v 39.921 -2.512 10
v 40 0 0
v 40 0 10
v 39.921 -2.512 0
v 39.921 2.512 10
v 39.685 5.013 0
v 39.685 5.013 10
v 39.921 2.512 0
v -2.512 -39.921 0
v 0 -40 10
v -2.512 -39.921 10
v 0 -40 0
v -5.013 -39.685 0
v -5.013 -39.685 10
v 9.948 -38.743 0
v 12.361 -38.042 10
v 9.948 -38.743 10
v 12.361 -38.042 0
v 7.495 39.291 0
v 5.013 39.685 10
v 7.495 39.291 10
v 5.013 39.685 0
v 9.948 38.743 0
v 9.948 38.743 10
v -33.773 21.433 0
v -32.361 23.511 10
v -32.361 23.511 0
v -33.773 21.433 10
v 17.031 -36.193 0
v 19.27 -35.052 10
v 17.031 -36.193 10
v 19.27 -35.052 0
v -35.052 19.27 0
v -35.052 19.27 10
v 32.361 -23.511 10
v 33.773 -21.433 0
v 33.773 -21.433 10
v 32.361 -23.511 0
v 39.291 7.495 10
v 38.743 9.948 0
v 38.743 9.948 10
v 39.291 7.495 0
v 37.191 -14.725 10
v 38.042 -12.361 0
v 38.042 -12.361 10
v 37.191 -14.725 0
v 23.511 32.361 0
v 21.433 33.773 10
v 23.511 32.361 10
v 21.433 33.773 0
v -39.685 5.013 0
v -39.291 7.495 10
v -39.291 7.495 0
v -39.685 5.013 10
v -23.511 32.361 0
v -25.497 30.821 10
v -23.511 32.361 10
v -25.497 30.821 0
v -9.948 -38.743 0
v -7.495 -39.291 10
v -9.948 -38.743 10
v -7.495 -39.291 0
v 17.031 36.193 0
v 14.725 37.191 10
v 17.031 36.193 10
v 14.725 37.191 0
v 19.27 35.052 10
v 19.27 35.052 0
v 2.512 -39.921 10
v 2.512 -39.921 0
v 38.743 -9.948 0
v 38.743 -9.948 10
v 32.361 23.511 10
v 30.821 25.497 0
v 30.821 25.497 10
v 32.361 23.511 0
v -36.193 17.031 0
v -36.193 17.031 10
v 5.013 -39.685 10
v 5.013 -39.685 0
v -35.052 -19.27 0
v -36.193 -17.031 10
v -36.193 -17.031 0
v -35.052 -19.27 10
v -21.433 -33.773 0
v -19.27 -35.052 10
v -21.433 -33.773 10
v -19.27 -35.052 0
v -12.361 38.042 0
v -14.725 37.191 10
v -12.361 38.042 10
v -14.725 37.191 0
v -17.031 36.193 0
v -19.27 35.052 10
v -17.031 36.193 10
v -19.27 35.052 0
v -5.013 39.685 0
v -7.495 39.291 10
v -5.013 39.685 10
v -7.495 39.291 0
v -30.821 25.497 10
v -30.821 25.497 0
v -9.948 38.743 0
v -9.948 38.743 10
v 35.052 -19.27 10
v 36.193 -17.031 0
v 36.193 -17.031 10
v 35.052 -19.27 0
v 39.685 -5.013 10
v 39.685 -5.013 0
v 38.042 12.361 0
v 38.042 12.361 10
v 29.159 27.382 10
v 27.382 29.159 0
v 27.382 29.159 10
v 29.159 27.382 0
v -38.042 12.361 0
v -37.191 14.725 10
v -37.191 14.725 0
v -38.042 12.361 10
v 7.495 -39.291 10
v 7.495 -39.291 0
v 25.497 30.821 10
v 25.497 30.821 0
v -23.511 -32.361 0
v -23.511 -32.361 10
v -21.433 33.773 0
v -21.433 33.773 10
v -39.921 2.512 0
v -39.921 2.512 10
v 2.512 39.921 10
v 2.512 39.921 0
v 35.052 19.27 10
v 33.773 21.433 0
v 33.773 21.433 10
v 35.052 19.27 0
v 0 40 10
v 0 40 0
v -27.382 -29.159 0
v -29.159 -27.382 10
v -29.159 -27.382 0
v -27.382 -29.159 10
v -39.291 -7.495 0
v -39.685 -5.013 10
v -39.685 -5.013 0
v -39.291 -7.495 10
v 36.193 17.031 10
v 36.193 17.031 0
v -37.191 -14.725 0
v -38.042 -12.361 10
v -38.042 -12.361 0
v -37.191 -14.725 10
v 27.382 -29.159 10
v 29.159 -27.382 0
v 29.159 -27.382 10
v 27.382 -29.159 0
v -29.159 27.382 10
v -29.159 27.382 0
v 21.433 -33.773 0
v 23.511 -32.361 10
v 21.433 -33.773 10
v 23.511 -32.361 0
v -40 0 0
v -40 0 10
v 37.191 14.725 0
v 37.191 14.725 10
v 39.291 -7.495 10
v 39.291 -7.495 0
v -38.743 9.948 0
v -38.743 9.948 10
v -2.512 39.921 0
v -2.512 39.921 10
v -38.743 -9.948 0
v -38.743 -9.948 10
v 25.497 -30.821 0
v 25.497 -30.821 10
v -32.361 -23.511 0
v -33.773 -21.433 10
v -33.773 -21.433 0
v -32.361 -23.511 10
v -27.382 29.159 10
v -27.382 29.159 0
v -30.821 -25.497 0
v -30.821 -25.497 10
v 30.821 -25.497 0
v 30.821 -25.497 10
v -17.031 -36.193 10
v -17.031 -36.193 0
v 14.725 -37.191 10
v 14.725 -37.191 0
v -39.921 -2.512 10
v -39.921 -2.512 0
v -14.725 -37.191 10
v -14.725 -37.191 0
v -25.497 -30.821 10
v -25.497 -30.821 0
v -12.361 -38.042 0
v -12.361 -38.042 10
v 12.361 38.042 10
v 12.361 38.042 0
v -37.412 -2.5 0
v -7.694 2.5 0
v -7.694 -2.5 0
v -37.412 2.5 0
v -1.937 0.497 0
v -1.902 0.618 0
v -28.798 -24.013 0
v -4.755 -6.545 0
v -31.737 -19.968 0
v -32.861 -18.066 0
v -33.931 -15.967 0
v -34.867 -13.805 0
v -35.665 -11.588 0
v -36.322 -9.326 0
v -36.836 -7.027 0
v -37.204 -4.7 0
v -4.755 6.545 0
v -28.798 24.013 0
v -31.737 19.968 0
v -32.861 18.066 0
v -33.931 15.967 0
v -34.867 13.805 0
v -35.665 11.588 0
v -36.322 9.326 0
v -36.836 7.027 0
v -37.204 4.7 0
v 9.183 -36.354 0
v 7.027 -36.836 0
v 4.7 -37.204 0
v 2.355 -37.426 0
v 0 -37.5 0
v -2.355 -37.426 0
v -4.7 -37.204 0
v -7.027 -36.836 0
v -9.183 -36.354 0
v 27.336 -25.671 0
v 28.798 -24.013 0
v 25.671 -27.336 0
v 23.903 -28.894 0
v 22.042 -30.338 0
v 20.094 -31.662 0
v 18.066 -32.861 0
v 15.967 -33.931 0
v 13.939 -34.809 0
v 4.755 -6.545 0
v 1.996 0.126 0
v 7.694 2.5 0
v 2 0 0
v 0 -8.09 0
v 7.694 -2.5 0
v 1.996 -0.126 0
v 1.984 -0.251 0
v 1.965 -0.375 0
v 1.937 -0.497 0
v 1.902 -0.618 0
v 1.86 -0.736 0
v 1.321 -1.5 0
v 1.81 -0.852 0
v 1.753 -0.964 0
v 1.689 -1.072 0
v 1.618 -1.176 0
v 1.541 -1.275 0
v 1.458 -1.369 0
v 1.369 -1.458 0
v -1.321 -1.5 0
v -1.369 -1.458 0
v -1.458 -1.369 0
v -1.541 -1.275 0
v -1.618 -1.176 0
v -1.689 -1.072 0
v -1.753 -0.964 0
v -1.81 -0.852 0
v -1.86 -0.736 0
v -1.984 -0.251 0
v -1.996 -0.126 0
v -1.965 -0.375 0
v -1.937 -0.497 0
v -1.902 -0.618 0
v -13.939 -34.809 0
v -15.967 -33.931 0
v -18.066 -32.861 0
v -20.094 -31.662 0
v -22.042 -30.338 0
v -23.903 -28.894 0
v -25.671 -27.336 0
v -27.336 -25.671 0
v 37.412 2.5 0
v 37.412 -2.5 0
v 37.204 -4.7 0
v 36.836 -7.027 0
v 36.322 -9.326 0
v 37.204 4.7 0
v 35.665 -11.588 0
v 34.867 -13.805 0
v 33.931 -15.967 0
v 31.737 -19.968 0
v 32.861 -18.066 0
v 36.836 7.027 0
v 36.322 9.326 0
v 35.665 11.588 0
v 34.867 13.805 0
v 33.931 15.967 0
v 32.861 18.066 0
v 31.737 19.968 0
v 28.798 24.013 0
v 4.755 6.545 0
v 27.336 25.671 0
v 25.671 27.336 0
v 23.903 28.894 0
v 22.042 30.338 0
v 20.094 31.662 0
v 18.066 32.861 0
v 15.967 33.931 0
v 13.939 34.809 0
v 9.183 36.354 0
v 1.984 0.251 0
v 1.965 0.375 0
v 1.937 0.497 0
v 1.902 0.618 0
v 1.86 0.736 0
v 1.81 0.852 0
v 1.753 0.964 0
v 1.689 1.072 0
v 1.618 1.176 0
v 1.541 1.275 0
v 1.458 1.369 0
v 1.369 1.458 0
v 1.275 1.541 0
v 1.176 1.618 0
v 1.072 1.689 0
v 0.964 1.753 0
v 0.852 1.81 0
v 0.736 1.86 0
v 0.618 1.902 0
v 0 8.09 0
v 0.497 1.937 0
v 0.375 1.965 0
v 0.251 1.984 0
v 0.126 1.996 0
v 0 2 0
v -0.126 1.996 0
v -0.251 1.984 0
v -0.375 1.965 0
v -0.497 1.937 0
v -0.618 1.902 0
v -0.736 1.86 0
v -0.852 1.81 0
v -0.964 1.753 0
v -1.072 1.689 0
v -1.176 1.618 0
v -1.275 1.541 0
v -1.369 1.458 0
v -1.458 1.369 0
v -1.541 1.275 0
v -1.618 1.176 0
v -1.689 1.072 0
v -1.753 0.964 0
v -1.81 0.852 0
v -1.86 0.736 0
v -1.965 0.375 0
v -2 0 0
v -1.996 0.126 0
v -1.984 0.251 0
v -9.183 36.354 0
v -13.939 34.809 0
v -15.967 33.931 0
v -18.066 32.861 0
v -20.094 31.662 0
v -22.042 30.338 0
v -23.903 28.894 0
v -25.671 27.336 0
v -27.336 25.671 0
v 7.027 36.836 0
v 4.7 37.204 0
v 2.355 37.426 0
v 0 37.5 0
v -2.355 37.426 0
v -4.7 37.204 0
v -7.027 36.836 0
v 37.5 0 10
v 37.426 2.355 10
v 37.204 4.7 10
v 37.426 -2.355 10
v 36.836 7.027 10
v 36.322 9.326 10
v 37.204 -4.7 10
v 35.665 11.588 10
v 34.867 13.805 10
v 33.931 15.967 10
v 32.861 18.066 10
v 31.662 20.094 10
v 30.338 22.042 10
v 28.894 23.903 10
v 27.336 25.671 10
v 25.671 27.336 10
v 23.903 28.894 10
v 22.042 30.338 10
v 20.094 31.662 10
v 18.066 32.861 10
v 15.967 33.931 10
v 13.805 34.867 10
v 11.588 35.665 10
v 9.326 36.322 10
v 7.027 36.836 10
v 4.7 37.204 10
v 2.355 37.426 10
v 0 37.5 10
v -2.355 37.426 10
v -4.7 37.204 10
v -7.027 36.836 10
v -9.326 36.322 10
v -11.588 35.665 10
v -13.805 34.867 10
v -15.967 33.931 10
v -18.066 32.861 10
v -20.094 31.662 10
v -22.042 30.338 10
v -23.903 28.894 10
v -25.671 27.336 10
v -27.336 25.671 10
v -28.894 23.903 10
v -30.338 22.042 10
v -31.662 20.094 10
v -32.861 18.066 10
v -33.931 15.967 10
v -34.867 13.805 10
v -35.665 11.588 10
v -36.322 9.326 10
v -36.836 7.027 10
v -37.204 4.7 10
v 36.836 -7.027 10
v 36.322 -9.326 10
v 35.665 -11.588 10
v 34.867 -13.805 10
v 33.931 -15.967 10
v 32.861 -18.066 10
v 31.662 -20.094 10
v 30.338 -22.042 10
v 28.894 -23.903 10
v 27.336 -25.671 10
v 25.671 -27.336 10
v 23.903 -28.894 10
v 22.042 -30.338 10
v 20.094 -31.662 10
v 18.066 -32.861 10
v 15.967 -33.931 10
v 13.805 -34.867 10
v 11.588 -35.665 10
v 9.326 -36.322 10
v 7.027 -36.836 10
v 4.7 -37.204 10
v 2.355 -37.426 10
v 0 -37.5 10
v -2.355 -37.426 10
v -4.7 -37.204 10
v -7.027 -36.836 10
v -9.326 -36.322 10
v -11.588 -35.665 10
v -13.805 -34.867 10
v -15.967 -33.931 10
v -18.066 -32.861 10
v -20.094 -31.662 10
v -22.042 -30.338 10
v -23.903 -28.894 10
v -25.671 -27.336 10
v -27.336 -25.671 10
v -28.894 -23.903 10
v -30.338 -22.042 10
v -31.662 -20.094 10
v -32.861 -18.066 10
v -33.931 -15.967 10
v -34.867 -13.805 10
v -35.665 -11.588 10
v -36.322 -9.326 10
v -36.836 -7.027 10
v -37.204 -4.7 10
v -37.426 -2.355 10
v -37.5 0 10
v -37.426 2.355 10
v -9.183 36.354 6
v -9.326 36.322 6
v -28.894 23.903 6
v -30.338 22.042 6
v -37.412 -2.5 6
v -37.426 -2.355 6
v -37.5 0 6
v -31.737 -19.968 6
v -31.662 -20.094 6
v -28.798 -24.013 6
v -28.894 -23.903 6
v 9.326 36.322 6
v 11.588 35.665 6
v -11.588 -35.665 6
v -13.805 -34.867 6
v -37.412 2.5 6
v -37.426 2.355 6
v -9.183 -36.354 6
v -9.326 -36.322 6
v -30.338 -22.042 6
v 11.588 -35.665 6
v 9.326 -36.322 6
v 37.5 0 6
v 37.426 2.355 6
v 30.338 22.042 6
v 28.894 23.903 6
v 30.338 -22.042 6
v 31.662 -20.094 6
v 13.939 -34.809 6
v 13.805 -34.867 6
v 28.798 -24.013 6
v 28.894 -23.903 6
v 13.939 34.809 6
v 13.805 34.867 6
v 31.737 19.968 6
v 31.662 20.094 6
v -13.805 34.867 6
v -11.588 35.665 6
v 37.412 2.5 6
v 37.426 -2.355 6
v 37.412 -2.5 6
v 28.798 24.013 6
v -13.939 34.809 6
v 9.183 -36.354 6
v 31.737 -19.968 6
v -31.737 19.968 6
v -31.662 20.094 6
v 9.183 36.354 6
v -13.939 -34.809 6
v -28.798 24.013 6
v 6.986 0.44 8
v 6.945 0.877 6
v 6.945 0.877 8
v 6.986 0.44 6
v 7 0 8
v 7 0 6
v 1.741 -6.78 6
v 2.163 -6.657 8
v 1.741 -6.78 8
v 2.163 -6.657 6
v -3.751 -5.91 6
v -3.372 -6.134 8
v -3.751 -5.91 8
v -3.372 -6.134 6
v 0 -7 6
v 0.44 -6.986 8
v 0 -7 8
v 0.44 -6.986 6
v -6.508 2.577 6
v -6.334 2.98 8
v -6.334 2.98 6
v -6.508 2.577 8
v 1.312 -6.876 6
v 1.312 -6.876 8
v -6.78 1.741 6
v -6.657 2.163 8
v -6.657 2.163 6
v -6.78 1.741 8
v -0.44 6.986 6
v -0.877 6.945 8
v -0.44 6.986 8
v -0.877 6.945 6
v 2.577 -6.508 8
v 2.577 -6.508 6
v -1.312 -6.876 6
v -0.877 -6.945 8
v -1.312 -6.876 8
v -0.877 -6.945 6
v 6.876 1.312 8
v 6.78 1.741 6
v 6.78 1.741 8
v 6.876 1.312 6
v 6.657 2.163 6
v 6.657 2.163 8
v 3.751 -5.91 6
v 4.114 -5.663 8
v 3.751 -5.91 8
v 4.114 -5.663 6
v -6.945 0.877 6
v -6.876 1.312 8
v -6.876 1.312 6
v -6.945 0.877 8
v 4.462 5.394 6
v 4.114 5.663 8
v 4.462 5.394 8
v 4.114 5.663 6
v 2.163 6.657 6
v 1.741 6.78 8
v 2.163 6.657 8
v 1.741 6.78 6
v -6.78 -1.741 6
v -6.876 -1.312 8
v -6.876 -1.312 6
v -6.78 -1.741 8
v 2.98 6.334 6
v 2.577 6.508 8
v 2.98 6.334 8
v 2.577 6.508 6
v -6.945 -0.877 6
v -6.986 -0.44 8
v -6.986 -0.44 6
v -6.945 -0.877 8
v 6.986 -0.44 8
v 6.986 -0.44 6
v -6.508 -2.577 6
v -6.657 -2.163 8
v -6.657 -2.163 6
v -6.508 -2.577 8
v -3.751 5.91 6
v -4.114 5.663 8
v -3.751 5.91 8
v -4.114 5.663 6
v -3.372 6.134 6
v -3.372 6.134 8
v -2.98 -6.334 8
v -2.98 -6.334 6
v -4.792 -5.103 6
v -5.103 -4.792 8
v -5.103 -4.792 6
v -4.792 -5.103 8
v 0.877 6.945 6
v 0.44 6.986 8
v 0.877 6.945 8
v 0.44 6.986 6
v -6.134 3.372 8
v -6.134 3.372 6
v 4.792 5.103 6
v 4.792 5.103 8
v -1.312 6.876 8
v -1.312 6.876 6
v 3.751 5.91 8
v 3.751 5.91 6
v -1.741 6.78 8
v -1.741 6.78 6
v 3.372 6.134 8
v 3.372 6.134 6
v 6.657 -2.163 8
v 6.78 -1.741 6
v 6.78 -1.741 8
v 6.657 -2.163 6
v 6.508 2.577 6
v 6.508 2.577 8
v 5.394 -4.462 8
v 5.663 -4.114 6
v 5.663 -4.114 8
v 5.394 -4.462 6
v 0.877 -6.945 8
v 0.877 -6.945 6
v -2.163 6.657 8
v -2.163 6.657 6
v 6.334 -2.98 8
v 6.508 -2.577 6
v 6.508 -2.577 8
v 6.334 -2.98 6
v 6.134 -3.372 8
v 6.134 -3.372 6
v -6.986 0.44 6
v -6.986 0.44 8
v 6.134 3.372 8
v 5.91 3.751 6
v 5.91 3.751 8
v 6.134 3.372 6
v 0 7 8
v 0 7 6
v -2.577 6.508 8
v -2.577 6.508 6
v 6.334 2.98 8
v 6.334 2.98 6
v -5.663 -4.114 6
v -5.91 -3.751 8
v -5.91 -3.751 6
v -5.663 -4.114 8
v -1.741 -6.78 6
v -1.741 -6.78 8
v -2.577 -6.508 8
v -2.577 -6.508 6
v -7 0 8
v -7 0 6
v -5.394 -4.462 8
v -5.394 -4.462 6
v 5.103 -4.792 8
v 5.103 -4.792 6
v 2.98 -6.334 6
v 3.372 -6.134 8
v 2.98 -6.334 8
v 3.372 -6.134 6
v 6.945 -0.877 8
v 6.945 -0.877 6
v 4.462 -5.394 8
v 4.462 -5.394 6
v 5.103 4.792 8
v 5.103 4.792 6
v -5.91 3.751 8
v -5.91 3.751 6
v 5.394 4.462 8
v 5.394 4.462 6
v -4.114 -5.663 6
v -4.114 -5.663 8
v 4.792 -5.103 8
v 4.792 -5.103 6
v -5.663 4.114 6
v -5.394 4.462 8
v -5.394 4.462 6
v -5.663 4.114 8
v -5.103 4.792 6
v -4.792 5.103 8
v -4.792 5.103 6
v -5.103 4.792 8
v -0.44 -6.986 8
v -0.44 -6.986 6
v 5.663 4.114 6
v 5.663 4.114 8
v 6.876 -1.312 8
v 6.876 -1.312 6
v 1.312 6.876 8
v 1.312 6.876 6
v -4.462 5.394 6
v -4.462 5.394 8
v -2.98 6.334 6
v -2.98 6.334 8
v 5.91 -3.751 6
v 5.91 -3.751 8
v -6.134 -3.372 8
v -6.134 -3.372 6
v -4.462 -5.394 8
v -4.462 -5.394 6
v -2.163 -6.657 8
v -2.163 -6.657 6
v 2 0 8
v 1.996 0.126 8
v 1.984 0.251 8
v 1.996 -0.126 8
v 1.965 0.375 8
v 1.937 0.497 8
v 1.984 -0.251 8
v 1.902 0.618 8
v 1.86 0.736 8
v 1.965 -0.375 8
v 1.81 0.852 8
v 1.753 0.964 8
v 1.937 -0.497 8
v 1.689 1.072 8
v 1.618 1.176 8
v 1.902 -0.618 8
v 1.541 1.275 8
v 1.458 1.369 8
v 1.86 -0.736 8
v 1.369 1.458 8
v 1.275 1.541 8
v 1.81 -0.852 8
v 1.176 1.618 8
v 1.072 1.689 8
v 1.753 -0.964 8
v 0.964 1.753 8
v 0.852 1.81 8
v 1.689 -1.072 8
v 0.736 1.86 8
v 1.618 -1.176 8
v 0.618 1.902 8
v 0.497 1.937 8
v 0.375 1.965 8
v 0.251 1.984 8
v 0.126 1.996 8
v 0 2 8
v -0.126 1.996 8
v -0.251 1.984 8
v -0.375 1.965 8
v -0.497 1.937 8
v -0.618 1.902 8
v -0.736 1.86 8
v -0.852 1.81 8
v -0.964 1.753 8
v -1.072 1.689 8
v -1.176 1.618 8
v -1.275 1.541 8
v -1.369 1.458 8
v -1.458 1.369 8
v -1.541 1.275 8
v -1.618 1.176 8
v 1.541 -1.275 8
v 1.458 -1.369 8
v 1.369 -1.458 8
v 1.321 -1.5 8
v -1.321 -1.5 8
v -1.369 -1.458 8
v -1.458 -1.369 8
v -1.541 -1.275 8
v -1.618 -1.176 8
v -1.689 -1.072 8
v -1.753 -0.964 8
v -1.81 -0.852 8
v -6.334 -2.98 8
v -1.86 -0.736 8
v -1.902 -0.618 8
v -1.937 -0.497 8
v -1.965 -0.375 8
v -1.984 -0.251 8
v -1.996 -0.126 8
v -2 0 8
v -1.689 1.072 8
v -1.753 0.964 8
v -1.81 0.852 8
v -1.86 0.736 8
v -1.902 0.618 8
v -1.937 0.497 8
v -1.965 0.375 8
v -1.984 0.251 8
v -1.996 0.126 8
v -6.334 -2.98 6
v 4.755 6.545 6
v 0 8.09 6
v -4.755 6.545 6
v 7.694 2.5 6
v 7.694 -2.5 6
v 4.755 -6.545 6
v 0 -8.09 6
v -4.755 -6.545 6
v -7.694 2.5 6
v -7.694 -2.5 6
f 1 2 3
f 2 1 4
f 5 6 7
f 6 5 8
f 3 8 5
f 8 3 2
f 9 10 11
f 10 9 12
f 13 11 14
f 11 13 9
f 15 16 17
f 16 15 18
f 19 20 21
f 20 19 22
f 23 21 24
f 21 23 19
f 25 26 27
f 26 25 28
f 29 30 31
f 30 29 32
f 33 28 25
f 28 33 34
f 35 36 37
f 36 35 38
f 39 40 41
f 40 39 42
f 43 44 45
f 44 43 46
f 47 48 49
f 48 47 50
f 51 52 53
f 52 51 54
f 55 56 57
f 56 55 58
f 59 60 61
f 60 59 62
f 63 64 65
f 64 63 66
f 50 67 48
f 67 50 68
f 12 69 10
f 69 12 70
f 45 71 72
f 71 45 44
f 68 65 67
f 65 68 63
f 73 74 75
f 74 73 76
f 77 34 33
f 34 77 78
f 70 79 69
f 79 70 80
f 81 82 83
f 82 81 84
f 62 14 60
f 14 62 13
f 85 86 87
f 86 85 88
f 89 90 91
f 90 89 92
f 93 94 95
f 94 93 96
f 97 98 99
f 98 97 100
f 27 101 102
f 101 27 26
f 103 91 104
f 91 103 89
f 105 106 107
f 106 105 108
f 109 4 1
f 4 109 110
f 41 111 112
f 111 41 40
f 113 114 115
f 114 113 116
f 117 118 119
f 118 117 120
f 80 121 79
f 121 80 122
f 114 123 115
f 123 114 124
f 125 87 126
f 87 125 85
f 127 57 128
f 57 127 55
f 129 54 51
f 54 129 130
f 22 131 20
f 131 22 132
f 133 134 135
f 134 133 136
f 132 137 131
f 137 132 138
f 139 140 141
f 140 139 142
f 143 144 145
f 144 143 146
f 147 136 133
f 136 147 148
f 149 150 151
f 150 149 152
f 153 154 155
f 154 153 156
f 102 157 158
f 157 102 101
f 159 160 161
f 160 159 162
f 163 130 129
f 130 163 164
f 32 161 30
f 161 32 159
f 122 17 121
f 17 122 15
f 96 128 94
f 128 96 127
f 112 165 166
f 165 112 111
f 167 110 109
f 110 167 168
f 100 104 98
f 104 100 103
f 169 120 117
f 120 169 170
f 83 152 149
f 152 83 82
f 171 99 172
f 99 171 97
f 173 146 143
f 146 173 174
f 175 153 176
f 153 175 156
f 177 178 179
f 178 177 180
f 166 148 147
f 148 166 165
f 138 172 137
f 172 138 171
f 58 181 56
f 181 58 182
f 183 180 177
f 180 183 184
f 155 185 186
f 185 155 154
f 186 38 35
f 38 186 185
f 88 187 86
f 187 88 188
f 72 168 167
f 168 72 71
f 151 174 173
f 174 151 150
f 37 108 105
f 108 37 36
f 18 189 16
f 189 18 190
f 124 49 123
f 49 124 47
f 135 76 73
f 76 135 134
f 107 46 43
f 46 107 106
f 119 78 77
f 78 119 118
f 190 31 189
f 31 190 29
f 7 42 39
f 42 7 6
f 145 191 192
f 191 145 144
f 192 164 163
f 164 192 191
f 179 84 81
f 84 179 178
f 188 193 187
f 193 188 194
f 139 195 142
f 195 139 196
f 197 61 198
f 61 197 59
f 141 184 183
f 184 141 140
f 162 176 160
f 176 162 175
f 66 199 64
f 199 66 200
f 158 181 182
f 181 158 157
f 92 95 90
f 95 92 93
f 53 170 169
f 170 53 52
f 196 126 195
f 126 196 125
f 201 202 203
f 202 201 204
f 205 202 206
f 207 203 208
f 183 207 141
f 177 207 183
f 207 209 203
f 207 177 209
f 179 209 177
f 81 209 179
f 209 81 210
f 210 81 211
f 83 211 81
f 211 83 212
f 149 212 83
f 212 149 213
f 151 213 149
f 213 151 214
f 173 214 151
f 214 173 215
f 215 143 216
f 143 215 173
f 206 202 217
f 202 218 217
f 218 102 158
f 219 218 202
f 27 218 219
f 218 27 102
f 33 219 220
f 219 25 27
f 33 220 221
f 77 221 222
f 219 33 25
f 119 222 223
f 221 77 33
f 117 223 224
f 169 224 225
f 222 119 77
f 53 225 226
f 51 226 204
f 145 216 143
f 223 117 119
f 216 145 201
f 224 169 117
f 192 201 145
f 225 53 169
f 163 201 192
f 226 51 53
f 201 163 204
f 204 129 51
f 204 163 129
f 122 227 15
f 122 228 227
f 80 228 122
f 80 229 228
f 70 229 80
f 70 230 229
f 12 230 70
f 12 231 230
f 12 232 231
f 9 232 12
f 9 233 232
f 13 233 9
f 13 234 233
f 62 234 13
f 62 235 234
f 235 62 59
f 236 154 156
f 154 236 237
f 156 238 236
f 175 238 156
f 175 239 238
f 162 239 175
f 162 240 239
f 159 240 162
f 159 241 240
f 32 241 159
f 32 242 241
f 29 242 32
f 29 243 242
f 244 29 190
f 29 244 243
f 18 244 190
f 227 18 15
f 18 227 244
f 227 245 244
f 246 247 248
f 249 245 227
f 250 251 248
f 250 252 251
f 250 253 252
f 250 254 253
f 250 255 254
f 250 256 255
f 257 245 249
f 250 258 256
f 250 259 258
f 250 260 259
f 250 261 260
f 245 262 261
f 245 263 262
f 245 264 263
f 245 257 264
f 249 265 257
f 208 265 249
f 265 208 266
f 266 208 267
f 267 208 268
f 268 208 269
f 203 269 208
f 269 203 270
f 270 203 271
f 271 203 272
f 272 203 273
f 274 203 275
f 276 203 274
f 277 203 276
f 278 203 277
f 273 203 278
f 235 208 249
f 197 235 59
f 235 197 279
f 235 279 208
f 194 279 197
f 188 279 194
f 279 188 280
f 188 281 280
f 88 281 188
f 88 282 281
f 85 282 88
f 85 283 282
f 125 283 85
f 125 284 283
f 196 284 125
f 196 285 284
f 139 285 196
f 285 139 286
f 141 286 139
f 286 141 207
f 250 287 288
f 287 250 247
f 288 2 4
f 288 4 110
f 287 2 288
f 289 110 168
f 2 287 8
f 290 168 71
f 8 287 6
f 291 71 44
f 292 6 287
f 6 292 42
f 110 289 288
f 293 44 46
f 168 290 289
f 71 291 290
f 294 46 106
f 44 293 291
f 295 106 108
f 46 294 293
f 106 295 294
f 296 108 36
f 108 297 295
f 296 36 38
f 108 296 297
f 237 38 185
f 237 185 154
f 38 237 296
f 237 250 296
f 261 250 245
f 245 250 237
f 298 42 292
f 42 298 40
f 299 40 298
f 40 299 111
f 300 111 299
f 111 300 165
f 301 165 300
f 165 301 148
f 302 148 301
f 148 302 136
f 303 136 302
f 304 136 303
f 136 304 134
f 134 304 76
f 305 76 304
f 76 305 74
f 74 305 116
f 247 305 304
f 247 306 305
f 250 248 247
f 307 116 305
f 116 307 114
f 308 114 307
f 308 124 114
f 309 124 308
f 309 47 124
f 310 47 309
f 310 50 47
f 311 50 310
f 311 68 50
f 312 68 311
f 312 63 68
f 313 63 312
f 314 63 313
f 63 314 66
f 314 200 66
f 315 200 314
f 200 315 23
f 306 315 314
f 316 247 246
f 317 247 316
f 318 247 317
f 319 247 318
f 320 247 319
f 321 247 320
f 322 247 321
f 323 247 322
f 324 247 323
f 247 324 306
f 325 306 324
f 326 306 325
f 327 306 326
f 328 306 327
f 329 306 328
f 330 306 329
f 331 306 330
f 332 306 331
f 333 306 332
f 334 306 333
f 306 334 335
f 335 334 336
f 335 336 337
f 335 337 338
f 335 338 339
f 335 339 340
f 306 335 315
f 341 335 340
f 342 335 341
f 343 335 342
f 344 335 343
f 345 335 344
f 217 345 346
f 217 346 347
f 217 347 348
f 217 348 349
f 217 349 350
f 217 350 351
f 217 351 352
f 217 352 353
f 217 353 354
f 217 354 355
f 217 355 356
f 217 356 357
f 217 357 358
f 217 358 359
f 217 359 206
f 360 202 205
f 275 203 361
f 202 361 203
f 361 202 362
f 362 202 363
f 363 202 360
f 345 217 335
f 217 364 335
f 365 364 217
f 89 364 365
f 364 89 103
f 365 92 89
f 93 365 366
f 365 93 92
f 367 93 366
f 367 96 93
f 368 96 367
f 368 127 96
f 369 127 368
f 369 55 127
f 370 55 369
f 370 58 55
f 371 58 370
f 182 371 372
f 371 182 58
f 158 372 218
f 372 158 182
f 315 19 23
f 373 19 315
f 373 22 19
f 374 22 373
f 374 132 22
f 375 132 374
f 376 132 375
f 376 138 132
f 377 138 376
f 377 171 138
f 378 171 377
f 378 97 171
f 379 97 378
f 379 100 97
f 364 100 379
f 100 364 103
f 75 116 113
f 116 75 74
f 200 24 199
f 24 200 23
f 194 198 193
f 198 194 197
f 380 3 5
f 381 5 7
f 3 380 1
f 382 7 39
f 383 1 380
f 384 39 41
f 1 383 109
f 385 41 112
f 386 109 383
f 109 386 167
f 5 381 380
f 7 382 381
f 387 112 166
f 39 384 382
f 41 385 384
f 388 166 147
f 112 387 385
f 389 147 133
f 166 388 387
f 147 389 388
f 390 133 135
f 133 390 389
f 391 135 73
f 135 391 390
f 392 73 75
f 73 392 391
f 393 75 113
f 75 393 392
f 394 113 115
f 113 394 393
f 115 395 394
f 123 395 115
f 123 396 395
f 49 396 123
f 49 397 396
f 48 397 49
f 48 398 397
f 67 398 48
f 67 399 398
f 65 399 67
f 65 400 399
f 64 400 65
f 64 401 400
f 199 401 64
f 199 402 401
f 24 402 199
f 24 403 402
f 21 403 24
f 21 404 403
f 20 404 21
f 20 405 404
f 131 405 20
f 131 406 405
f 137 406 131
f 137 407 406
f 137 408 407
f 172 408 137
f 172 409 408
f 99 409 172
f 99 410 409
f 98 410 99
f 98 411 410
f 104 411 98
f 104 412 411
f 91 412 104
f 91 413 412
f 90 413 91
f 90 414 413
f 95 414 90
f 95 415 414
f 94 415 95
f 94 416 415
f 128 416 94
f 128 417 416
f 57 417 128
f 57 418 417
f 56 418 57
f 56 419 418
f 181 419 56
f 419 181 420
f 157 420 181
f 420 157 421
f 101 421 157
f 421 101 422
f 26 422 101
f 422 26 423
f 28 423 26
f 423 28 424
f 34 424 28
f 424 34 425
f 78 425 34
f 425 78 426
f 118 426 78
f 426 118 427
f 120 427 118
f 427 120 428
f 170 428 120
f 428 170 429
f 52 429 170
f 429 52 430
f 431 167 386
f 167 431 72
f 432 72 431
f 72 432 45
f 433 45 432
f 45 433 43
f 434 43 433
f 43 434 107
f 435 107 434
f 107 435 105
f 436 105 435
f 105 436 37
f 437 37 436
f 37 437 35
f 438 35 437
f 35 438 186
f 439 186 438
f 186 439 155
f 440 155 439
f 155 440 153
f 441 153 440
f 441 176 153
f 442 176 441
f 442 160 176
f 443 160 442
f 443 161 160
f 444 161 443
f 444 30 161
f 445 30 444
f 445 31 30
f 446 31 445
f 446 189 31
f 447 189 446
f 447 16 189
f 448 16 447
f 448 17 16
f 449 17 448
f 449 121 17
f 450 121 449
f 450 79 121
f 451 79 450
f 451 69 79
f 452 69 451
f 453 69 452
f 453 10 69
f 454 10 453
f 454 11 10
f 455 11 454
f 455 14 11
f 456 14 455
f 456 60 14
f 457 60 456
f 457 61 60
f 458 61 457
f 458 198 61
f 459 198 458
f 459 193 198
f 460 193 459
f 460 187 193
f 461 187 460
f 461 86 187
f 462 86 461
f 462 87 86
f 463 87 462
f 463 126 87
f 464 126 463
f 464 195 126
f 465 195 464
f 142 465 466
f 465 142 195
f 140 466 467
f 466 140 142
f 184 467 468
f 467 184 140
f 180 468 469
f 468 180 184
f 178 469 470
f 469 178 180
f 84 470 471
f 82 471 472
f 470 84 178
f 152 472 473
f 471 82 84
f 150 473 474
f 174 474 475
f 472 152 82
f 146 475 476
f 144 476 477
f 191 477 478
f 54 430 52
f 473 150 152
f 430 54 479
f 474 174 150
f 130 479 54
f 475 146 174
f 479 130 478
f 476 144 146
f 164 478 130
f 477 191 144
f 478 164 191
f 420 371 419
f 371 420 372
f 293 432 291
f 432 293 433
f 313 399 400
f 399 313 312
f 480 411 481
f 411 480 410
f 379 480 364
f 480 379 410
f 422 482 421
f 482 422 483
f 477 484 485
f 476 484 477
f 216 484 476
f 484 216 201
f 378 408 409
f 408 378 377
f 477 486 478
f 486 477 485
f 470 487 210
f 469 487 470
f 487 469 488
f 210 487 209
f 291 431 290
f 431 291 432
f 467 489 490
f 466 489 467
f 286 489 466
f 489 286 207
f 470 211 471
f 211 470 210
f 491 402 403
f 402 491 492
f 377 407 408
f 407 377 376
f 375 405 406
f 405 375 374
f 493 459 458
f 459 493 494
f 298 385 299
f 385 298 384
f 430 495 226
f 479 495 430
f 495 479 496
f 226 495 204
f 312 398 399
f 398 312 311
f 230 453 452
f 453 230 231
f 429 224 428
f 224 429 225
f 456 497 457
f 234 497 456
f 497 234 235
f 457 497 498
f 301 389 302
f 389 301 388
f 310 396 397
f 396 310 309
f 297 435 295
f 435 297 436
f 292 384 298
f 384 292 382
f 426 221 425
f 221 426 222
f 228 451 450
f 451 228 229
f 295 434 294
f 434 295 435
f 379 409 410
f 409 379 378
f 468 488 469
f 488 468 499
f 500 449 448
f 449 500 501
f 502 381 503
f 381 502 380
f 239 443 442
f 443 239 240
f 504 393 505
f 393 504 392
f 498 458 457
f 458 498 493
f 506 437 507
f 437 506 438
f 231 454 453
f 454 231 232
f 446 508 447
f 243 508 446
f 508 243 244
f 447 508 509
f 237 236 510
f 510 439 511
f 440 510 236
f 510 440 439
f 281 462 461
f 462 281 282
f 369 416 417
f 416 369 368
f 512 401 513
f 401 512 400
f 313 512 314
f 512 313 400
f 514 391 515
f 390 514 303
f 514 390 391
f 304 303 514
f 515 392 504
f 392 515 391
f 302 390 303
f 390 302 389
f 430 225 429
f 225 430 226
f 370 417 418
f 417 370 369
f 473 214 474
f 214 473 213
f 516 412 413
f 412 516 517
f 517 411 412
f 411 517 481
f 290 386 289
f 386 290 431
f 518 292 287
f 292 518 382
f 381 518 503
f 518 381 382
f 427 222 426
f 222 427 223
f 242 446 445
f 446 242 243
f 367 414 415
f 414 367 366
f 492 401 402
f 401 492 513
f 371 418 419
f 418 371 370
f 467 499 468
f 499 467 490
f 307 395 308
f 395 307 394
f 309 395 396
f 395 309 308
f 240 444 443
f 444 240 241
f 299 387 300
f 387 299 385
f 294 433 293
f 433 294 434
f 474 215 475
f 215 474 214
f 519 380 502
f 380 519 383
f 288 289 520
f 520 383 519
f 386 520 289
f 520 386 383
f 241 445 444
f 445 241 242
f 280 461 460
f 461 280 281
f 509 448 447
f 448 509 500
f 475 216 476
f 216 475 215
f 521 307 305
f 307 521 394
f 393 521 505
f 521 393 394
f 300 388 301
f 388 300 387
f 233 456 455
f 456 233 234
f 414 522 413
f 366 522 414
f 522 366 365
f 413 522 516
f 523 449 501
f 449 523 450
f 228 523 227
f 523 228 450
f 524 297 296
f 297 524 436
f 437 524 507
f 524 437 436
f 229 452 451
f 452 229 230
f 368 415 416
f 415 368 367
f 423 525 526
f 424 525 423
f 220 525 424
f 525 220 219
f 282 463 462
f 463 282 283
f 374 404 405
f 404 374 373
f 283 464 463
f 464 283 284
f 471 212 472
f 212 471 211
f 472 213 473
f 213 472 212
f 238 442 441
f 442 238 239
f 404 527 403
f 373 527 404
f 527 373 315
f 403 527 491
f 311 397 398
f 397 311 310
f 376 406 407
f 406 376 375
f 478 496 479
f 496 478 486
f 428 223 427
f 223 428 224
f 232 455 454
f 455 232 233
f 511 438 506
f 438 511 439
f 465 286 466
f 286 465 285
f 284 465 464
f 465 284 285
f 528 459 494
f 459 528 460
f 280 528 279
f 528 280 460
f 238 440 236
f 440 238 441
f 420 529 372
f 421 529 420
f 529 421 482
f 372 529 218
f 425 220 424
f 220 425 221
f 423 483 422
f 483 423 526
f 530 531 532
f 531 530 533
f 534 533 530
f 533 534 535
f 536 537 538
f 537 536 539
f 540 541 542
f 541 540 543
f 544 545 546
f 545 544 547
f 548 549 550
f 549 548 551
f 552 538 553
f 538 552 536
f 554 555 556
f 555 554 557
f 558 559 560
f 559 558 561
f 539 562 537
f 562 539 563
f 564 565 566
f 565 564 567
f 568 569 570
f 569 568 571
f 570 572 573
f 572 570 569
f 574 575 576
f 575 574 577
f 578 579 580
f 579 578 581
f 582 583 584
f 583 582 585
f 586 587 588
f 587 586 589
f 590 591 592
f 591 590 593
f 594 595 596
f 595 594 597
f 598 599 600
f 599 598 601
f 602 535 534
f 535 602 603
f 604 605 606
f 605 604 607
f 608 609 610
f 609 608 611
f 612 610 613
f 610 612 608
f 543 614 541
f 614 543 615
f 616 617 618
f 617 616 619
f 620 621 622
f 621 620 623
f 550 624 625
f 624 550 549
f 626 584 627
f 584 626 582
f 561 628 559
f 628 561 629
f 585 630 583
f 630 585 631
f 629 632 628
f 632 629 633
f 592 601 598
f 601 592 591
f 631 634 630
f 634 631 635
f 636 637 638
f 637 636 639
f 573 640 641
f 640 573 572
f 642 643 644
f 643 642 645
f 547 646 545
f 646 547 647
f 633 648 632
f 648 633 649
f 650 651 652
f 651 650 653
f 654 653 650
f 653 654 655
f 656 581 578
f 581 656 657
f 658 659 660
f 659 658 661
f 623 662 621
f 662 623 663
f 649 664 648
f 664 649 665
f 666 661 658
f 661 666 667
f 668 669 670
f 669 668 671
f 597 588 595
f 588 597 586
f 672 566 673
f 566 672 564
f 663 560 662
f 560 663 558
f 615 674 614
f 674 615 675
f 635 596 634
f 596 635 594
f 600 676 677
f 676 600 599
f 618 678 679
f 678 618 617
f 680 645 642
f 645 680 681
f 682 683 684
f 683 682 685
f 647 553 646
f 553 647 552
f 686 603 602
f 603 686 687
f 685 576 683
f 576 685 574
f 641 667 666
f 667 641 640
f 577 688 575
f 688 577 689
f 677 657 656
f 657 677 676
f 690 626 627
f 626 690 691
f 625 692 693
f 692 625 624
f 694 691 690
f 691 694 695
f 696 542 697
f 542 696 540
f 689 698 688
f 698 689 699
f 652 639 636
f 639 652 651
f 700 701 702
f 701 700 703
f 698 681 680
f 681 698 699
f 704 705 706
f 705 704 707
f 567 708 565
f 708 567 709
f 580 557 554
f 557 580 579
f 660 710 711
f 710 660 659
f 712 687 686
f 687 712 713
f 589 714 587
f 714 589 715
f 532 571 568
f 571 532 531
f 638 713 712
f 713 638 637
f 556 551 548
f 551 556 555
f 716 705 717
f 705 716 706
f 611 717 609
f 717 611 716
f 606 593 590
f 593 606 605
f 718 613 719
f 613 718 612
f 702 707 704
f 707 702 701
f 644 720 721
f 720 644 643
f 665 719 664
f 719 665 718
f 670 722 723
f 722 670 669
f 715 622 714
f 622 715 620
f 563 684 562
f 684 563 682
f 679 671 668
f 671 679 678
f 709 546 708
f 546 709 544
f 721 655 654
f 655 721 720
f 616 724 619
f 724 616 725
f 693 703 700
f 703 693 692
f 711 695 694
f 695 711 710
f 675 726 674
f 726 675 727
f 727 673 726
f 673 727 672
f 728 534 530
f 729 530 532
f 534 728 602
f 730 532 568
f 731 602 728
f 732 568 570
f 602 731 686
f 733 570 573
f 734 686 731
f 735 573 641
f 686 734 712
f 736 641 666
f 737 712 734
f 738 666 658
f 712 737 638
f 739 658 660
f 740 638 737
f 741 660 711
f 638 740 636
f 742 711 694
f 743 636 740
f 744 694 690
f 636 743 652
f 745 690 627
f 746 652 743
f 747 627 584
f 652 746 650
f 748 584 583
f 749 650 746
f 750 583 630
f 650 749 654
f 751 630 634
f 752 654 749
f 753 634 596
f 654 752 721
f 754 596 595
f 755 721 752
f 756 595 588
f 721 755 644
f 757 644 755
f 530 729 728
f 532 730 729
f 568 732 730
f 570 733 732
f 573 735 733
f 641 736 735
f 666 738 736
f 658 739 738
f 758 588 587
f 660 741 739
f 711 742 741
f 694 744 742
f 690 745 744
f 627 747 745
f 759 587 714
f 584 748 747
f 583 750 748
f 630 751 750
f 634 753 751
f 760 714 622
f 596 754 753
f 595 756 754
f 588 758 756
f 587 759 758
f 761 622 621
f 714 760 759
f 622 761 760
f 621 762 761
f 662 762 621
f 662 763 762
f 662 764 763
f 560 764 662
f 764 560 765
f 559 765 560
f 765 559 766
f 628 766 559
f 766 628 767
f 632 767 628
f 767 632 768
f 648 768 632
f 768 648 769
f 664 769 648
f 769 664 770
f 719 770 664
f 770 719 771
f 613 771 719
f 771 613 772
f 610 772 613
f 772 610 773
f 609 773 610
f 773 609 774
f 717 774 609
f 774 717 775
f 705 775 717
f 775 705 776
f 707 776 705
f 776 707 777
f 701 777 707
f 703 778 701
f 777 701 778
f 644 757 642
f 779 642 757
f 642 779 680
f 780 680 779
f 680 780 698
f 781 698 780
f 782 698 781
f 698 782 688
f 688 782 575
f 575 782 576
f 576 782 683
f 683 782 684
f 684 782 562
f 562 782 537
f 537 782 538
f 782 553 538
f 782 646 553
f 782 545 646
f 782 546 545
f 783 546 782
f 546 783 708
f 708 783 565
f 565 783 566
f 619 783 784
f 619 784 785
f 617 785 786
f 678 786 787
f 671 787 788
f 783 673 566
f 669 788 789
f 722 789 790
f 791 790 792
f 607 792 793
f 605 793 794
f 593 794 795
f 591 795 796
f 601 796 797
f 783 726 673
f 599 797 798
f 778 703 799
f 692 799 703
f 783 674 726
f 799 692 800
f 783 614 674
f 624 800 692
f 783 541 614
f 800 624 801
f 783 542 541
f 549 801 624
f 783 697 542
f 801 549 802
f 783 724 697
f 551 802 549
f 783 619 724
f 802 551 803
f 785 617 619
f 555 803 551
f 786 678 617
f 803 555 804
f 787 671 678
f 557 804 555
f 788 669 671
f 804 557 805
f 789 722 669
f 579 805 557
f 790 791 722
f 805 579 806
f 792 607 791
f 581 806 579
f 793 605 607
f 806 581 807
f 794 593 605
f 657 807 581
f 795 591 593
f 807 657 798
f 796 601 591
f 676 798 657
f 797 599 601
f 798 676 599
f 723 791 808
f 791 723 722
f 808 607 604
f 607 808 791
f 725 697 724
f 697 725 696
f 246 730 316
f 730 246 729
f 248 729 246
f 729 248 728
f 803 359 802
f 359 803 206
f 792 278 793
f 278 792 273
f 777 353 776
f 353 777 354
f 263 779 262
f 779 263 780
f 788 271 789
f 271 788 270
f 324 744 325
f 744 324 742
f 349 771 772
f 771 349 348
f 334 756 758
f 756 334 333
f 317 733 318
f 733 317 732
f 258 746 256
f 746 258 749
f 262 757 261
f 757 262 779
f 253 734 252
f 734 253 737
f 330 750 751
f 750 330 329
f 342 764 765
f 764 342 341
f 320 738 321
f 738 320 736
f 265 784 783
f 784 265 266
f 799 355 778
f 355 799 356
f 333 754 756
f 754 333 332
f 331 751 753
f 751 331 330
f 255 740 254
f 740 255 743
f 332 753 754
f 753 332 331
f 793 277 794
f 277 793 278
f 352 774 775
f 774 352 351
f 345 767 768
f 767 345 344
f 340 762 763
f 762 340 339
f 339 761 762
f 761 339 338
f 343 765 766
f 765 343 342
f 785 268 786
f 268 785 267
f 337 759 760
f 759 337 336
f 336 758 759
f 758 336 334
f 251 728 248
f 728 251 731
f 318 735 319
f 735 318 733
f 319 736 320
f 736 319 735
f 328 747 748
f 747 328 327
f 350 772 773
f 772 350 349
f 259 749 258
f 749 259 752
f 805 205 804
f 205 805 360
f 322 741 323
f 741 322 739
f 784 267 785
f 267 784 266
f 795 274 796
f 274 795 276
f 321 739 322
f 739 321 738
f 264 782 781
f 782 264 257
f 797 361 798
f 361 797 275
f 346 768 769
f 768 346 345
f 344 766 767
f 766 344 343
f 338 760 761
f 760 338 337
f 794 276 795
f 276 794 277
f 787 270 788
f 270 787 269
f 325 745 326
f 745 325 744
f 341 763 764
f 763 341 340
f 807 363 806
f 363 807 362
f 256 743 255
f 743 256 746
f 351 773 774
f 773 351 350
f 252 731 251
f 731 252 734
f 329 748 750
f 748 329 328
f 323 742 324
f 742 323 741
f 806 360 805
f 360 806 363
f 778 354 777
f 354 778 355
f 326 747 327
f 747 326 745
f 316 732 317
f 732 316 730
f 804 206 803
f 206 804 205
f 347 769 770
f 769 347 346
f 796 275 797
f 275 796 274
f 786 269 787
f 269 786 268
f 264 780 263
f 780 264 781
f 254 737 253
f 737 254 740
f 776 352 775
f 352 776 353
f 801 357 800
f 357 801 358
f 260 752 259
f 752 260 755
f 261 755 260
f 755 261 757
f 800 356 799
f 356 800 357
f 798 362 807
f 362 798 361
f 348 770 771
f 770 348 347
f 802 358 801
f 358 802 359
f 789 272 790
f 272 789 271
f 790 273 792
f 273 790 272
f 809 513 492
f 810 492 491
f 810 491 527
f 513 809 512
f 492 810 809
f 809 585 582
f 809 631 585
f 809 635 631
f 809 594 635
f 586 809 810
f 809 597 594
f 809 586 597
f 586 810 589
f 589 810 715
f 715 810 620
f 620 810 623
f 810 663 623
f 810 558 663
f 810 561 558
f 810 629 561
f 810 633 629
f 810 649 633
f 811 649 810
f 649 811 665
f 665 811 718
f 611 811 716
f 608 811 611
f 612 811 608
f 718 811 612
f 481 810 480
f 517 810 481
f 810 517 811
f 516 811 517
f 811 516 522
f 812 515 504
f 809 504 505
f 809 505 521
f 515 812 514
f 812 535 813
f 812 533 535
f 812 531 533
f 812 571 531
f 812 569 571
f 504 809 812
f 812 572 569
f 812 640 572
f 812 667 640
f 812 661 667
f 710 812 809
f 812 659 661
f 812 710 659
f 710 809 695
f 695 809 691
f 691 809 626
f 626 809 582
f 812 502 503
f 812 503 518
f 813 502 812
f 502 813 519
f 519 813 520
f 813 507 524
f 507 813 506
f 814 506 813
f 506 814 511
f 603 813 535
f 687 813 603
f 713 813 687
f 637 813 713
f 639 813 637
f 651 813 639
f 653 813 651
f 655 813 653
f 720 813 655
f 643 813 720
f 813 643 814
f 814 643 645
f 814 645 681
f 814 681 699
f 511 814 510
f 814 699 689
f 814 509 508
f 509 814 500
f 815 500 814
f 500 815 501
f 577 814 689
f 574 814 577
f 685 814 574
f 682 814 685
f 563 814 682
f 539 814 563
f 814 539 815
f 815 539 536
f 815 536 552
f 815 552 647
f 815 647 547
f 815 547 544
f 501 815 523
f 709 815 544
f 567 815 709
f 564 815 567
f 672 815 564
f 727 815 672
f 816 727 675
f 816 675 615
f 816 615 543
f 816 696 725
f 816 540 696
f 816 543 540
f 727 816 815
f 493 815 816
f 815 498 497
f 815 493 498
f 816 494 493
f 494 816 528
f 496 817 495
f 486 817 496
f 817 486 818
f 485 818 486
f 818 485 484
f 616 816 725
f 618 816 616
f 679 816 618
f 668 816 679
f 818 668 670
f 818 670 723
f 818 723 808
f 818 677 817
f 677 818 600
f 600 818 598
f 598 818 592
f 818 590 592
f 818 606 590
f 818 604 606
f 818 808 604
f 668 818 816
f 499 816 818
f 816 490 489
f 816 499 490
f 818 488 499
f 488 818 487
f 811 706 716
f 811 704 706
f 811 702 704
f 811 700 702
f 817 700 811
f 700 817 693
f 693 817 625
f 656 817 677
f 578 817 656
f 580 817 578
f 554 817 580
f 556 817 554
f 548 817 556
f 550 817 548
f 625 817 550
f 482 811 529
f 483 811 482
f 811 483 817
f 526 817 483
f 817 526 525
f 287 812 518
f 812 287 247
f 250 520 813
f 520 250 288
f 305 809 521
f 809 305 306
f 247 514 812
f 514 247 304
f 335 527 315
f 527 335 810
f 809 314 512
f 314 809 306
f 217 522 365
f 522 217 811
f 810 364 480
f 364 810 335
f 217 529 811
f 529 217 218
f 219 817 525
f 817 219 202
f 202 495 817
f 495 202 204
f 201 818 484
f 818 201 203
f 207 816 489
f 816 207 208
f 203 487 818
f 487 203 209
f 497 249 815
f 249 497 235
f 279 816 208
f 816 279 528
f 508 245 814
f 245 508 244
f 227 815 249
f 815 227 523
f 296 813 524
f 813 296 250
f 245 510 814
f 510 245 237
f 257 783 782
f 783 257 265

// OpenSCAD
/*
 * Wheel Generator v1.1
 *
 * http://www.thingiverse.com/thing:1887576
 *
 * By: Maxstupo
 */

// (The outer diameter of the wheel):
outerDiameter = 80; 

// (The width of the wheel):
treadWidth = 10;

// (The thickness of the outer wheel ring):
treadThickness = 5; 

// (The axle diameter):
shaftDiameter = 4; 

// (The thickness of the hub):
hubThickness = 10; 

// (The width of the hub):
hubWidth = 8; 

// (The width of the keyed hole, set to zero to disable):
keyWidth = 3.5; 

// (Number of spokes):
spokeCount = 10;

// (The width of each spoke):
spokeWidth = 5; 

// (The height of each spoke in Z axis):
spokeThickness = 6;

/* [Misc] */
$fn = 100;

makeWheel(outerDiameter,treadWidth,treadThickness,shaftDiameter,hubThickness,hubWidth,keyWidth,spokeCount,spokeWidth,spokeThickness);

module makeWheel(outerDiameter=80, treadWidth=10, treadThickness=5, shaftDiameter=4, hubThickness=10,hubWidth=8,keyWidth=1.5,spokeCount=10,spokeWidth=5,spokeThickness=6){
union(){
    hollowCylinder(outerDiameter, outerDiameter - treadThickness, treadWidth); // The "wheel"
 
    union(){
       hollowCylinder(shaftDiameter + hubThickness, shaftDiameter, hubWidth); // The wheel hub
        
        // Spokes
        difference(){
            union(){
                for (i = [0 : (360 / spokeCount) : 360]) {
                    rotate([0, 0, i]) translate([0, -spokeWidth / 2, 0]) cube([outerDiameter / 2, spokeWidth, spokeThickness]);   
                }
            }
            translate([0, 0, -1]) cylinder(h=spokeThickness + 2, d=shaftDiameter);
            translate([0, 0, -1]) hollowCylinder(outerDiameter + treadThickness, outerDiameter, spokeThickness + 2);
        }
         
        // Make the shaft hole keyed
        if(keyWidth>0){
            difference(){
                translate([-shaftDiameter / 2, -shaftDiameter / 2, 0]) cube([shaftDiameter, shaftDiameter - keyWidth, hubWidth]);
                translate([0, 0, -1]) hollowCylinder(outerDiameter - treadThickness, shaftDiameter + hubThickness, hubWidth + 2);
            }
        }
    }
}
}

module hollowCylinder(od, id, h){
    difference(){
        cylinder(d=od, h=h);
        translate([0, 0, -1]) cylinder(d=id, h=h + 2);
    }
}
